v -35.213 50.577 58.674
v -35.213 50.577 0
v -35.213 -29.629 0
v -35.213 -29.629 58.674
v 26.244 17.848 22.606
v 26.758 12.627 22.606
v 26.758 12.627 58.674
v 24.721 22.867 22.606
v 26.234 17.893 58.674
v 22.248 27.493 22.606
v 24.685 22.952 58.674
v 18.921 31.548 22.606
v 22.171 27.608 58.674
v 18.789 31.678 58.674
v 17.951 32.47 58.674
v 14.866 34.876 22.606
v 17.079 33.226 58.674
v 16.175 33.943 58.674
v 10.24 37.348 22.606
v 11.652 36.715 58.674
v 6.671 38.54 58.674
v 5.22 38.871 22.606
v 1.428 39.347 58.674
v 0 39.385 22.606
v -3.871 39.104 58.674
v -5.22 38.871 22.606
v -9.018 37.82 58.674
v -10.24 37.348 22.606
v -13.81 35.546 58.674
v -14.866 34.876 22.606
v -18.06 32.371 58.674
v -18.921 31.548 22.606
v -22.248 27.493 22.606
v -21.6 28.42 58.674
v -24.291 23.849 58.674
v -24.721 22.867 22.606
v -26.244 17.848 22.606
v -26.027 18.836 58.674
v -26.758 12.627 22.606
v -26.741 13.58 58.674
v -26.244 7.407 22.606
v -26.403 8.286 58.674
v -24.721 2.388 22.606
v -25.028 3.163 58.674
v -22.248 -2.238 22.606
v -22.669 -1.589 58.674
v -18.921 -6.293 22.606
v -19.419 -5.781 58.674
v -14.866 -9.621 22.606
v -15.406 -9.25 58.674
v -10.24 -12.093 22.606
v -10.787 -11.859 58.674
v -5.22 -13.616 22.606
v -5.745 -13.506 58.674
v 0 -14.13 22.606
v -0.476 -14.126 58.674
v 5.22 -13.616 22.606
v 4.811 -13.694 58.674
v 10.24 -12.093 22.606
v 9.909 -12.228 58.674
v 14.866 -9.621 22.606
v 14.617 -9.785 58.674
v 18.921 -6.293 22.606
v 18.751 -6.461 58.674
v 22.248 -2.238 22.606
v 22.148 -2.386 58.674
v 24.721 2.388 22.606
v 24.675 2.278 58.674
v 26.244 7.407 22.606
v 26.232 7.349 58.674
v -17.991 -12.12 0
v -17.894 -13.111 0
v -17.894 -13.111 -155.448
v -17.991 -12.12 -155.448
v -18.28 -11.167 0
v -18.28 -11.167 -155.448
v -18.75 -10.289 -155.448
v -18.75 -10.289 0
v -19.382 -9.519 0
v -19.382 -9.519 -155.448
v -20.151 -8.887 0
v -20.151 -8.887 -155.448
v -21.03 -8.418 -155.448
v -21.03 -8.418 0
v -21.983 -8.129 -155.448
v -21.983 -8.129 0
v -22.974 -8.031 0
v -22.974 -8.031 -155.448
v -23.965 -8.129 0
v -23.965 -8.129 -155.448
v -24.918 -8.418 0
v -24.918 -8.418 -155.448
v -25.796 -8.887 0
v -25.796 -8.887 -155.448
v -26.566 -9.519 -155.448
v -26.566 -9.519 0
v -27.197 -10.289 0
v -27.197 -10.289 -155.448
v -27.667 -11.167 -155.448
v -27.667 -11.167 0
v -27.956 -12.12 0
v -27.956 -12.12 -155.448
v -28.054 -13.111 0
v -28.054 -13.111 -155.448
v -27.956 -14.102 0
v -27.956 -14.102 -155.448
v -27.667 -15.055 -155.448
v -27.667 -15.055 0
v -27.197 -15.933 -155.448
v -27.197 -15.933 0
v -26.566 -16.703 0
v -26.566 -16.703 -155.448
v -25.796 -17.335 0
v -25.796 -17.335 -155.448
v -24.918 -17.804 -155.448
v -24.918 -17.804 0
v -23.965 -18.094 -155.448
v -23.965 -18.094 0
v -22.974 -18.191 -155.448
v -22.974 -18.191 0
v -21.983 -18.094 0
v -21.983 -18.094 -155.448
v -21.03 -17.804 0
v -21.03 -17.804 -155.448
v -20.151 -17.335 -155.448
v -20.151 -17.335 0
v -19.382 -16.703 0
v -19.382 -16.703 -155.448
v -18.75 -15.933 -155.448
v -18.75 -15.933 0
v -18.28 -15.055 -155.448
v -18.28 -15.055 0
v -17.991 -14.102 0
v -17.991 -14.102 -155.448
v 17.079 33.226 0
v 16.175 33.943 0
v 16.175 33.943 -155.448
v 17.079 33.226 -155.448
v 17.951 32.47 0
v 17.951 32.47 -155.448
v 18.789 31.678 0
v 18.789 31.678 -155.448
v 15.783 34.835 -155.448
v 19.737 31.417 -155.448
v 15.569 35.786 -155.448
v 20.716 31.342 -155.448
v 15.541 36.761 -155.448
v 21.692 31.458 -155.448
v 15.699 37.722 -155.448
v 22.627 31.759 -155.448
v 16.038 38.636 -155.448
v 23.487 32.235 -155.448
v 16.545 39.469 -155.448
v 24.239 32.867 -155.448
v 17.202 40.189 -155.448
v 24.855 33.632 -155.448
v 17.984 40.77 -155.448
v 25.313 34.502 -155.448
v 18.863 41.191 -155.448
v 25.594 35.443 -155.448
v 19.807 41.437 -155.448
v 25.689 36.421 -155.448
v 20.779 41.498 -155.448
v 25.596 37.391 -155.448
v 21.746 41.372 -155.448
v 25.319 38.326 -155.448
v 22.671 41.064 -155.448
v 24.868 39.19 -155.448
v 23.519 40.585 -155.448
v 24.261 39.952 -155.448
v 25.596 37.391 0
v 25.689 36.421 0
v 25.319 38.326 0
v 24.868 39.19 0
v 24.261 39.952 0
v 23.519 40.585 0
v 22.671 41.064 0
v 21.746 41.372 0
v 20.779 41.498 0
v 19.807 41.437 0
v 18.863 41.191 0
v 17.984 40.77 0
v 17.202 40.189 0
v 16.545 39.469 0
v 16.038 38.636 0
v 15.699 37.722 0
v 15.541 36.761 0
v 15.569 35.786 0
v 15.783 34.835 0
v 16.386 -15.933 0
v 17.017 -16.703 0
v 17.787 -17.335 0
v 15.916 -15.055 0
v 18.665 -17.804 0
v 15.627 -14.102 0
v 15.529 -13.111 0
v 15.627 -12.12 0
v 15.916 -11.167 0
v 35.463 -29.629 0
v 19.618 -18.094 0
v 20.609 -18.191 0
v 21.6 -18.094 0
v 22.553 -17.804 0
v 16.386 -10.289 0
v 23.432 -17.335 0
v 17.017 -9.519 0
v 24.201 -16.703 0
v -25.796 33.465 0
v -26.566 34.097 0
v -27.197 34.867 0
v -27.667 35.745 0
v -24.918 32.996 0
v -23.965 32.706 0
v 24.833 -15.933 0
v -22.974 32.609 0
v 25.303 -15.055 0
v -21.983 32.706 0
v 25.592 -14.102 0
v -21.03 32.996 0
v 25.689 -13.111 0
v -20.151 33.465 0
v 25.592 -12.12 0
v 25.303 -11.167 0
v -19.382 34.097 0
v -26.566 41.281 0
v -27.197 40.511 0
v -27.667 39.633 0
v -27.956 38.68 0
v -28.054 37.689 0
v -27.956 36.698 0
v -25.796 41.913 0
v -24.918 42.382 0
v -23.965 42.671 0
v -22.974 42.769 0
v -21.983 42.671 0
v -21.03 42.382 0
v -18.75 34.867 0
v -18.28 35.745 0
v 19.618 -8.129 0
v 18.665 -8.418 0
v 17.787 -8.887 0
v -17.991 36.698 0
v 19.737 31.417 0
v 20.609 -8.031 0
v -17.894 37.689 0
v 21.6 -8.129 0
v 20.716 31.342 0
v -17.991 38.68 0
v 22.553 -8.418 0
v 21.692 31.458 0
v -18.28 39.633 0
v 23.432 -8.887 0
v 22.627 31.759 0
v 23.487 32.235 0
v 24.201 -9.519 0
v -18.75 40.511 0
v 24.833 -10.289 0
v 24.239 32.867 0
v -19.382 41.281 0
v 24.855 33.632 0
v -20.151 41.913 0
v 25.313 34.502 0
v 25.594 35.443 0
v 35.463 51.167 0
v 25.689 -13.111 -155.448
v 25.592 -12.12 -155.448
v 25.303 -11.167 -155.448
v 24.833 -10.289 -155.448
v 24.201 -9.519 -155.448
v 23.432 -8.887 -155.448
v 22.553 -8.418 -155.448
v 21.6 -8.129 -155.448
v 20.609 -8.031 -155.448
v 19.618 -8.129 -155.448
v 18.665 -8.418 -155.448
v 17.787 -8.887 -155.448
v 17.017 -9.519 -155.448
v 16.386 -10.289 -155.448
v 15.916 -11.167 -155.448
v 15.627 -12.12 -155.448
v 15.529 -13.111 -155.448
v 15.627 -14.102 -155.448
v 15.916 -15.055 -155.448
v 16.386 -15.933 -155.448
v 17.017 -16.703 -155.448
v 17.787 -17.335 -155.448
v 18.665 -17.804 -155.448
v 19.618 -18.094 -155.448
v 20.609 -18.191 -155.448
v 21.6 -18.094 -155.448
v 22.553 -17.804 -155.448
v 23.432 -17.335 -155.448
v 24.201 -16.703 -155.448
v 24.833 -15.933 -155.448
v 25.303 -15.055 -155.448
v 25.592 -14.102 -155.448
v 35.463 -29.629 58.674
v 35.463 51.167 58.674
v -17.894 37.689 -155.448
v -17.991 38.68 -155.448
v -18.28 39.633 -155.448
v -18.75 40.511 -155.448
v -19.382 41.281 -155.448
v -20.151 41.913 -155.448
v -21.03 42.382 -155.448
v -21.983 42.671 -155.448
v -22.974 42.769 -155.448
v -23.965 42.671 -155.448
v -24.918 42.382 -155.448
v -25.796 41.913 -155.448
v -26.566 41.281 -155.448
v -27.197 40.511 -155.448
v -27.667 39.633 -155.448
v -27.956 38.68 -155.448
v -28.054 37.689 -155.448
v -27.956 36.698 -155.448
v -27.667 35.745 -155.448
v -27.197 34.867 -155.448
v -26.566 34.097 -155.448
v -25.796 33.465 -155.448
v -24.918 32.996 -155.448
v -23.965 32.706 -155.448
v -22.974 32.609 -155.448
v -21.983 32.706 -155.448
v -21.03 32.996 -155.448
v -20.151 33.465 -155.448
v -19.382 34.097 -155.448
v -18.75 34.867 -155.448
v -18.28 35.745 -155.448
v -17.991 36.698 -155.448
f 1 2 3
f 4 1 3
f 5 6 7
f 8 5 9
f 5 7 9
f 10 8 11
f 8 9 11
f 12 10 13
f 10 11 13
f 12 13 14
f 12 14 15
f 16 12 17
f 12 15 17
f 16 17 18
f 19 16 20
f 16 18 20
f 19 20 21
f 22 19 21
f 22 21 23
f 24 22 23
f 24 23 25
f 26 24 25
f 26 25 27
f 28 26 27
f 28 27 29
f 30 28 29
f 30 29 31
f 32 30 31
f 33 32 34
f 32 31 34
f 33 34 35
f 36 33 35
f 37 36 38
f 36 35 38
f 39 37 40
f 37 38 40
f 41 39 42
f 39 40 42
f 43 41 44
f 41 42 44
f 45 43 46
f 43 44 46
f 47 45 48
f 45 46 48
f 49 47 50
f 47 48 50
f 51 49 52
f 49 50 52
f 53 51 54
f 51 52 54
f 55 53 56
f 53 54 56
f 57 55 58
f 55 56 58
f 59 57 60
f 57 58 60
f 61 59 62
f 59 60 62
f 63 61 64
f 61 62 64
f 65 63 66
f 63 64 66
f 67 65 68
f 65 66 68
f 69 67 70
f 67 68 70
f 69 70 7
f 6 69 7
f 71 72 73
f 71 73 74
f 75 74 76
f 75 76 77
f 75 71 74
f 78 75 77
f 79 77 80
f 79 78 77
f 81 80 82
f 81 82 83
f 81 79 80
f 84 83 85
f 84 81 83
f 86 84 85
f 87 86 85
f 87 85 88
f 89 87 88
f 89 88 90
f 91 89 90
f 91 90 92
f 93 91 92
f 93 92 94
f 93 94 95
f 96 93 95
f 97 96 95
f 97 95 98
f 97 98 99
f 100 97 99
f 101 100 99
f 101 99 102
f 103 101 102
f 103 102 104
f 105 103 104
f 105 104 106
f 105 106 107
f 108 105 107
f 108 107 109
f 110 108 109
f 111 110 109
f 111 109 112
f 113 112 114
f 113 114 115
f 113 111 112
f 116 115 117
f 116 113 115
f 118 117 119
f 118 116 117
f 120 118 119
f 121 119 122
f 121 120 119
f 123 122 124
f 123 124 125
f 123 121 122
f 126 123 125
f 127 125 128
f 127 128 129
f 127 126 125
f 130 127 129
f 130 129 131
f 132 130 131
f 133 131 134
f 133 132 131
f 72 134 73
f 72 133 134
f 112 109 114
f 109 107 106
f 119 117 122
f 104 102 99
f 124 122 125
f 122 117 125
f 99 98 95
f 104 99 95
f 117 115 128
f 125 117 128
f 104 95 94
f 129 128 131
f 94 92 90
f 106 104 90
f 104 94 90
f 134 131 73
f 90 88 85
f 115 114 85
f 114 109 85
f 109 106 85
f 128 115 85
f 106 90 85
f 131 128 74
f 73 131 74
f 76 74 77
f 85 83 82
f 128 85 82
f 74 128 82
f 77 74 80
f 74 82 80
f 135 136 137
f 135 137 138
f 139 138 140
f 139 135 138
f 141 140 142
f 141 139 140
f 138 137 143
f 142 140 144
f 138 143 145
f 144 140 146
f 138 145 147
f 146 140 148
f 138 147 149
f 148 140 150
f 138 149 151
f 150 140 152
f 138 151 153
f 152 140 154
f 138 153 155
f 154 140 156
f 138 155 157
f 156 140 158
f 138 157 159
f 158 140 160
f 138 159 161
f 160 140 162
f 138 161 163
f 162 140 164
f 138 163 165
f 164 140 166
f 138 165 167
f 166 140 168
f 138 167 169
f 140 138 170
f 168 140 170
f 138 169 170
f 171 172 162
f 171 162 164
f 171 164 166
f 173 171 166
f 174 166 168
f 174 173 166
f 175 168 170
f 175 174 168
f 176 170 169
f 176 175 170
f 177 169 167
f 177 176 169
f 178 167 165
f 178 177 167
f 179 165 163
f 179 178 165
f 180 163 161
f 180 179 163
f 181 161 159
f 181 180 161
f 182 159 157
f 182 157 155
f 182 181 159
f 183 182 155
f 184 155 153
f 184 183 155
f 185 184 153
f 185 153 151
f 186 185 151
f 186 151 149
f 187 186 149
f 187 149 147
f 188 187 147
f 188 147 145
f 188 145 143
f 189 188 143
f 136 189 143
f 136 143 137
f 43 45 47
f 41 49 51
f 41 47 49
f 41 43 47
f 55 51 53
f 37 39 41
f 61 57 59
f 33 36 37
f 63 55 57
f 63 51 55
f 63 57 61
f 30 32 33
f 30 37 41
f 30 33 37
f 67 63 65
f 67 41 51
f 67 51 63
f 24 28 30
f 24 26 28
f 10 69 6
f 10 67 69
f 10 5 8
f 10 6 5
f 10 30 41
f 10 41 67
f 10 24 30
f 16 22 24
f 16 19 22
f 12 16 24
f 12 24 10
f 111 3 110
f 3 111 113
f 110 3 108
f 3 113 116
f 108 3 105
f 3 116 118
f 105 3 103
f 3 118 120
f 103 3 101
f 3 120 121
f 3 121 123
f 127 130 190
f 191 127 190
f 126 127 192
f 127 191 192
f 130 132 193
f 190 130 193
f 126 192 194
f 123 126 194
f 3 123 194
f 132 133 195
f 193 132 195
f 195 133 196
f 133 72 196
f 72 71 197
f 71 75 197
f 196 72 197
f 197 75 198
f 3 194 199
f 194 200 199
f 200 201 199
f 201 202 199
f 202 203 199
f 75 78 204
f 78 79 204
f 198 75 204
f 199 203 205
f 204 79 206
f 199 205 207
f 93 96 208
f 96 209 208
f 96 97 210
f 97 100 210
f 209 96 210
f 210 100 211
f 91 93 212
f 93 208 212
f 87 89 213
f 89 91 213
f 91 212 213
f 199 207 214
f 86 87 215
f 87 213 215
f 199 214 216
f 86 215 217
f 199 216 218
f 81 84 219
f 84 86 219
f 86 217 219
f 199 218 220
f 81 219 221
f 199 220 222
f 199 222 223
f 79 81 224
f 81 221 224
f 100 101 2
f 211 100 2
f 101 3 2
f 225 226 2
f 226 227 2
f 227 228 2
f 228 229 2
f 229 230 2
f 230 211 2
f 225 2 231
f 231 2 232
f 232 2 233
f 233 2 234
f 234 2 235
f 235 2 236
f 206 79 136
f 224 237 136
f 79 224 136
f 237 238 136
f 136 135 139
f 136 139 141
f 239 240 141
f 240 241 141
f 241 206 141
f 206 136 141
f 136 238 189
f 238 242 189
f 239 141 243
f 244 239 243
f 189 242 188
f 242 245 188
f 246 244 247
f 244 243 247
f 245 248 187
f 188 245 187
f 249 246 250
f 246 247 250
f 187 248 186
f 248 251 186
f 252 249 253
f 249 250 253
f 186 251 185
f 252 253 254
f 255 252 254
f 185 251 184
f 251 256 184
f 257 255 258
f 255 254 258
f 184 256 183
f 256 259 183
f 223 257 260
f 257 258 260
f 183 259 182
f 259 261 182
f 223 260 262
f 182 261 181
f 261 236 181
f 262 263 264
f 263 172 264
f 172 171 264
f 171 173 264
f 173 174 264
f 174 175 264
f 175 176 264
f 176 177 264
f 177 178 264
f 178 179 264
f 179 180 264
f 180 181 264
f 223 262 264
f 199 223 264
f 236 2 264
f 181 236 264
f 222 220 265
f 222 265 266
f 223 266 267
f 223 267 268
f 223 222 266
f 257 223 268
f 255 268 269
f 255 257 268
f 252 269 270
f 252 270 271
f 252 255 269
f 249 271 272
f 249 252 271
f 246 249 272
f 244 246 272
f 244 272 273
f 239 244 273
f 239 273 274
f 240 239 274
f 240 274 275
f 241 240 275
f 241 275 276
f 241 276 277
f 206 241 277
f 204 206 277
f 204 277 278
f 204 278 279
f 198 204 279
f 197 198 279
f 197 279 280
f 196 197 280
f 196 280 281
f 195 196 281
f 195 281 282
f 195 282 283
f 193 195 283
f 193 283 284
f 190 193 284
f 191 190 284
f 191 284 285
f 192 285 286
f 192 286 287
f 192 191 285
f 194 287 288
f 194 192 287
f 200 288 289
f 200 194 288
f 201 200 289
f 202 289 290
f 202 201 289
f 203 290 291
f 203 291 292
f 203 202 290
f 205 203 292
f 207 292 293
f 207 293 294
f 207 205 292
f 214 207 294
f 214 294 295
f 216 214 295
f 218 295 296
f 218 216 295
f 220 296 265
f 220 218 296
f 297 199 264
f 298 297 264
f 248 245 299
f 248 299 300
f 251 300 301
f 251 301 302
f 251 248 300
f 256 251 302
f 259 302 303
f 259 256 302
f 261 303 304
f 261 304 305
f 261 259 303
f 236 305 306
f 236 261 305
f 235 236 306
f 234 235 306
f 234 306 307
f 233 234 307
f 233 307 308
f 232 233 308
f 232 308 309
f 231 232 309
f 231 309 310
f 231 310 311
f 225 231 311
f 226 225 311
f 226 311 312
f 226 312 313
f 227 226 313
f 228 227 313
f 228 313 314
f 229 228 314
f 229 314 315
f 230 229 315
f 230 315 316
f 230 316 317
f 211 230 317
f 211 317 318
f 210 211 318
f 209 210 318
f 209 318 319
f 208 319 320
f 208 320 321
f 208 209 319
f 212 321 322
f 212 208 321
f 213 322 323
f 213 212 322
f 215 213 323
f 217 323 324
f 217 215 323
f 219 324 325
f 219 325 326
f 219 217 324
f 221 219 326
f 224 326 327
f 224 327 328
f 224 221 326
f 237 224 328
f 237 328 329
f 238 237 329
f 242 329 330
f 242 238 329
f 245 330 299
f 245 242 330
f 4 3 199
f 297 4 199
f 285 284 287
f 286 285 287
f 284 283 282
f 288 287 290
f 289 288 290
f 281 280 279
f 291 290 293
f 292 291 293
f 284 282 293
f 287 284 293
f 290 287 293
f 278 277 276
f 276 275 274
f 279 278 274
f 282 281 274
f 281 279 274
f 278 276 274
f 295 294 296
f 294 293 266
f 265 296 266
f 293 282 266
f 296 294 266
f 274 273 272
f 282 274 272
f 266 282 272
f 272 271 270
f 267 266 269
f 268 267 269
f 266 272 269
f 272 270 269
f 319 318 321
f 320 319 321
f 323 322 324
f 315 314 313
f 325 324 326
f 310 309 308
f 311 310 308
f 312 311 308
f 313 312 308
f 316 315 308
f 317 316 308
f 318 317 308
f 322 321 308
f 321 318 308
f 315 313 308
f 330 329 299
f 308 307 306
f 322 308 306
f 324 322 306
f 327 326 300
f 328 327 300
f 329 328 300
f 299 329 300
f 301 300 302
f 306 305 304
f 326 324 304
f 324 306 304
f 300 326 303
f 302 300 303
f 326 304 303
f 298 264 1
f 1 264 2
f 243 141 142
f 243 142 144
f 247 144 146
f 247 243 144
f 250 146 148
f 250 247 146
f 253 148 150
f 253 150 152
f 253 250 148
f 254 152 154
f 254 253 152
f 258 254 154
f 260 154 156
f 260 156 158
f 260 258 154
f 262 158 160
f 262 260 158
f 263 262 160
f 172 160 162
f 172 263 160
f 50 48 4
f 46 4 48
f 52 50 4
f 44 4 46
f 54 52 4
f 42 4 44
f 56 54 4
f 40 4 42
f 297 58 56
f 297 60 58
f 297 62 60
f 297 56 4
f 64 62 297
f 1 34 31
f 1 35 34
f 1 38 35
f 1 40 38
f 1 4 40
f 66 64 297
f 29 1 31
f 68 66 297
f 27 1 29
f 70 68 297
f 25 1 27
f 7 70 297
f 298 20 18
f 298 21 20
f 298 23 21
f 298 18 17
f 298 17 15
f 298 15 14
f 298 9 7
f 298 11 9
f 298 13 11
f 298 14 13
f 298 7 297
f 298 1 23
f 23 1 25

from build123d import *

# Parameters (mm, degrees)
F1_DEPTH = 58.674
F2_R     = 26.7576481094
F3_DEPTH = 36.068
F4_R     = 5.08
F5_DEPTH = 214.122


with BuildPart() as f1:
    # F0 (on Top) → F1 (new body)
    with BuildSketch(Plane.XY):
        Polygon((35.4626365006, 51.1673055589), (-35.2130606771, 50.5765117705), (-35.2130606771, -29.6294502914), (35.4626365006, -29.6294502914), align=None)
    extrude(amount=F1_DEPTH)

    # F2 (on face) → F3 (cut)
    with BuildSketch(Plane.XY.offset(58.674)):
        with Locations((0, 12.6274535432)):
            Circle(F2_R)
    extrude(amount=-F3_DEPTH, mode=Mode.SUBTRACT)

    # F4 (on face) → F5 (join)
    with BuildSketch(Plane.XY.offset(58.674)):
        with Locations((-22.9736331001, -13.1111371607)):
            Circle(F4_R)
        with Locations((-22.9736331001, 37.6888628393)):
            Circle(F4_R)
        with BuildLine():
            ThreePointArc((18.7894253284, 31.6781550573), (23.486962927, 32.2345703811), (25.6893701616, 36.4209602192))
            ThreePointArc((25.6893701616, 36.4209602192), (19.3290072561, 41.3369617275), (16.1747753466, 33.9429027488))
            ThreePointArc((16.1747753466, 33.9429027488), (17.5187357631, 32.852824482), (18.7894253284, 31.6781550573))
        make_face()
        with Locations((20.6093701616, -13.1111371607)):
            Circle(F4_R)
    extrude(amount=-F5_DEPTH)


solid = f1.part
